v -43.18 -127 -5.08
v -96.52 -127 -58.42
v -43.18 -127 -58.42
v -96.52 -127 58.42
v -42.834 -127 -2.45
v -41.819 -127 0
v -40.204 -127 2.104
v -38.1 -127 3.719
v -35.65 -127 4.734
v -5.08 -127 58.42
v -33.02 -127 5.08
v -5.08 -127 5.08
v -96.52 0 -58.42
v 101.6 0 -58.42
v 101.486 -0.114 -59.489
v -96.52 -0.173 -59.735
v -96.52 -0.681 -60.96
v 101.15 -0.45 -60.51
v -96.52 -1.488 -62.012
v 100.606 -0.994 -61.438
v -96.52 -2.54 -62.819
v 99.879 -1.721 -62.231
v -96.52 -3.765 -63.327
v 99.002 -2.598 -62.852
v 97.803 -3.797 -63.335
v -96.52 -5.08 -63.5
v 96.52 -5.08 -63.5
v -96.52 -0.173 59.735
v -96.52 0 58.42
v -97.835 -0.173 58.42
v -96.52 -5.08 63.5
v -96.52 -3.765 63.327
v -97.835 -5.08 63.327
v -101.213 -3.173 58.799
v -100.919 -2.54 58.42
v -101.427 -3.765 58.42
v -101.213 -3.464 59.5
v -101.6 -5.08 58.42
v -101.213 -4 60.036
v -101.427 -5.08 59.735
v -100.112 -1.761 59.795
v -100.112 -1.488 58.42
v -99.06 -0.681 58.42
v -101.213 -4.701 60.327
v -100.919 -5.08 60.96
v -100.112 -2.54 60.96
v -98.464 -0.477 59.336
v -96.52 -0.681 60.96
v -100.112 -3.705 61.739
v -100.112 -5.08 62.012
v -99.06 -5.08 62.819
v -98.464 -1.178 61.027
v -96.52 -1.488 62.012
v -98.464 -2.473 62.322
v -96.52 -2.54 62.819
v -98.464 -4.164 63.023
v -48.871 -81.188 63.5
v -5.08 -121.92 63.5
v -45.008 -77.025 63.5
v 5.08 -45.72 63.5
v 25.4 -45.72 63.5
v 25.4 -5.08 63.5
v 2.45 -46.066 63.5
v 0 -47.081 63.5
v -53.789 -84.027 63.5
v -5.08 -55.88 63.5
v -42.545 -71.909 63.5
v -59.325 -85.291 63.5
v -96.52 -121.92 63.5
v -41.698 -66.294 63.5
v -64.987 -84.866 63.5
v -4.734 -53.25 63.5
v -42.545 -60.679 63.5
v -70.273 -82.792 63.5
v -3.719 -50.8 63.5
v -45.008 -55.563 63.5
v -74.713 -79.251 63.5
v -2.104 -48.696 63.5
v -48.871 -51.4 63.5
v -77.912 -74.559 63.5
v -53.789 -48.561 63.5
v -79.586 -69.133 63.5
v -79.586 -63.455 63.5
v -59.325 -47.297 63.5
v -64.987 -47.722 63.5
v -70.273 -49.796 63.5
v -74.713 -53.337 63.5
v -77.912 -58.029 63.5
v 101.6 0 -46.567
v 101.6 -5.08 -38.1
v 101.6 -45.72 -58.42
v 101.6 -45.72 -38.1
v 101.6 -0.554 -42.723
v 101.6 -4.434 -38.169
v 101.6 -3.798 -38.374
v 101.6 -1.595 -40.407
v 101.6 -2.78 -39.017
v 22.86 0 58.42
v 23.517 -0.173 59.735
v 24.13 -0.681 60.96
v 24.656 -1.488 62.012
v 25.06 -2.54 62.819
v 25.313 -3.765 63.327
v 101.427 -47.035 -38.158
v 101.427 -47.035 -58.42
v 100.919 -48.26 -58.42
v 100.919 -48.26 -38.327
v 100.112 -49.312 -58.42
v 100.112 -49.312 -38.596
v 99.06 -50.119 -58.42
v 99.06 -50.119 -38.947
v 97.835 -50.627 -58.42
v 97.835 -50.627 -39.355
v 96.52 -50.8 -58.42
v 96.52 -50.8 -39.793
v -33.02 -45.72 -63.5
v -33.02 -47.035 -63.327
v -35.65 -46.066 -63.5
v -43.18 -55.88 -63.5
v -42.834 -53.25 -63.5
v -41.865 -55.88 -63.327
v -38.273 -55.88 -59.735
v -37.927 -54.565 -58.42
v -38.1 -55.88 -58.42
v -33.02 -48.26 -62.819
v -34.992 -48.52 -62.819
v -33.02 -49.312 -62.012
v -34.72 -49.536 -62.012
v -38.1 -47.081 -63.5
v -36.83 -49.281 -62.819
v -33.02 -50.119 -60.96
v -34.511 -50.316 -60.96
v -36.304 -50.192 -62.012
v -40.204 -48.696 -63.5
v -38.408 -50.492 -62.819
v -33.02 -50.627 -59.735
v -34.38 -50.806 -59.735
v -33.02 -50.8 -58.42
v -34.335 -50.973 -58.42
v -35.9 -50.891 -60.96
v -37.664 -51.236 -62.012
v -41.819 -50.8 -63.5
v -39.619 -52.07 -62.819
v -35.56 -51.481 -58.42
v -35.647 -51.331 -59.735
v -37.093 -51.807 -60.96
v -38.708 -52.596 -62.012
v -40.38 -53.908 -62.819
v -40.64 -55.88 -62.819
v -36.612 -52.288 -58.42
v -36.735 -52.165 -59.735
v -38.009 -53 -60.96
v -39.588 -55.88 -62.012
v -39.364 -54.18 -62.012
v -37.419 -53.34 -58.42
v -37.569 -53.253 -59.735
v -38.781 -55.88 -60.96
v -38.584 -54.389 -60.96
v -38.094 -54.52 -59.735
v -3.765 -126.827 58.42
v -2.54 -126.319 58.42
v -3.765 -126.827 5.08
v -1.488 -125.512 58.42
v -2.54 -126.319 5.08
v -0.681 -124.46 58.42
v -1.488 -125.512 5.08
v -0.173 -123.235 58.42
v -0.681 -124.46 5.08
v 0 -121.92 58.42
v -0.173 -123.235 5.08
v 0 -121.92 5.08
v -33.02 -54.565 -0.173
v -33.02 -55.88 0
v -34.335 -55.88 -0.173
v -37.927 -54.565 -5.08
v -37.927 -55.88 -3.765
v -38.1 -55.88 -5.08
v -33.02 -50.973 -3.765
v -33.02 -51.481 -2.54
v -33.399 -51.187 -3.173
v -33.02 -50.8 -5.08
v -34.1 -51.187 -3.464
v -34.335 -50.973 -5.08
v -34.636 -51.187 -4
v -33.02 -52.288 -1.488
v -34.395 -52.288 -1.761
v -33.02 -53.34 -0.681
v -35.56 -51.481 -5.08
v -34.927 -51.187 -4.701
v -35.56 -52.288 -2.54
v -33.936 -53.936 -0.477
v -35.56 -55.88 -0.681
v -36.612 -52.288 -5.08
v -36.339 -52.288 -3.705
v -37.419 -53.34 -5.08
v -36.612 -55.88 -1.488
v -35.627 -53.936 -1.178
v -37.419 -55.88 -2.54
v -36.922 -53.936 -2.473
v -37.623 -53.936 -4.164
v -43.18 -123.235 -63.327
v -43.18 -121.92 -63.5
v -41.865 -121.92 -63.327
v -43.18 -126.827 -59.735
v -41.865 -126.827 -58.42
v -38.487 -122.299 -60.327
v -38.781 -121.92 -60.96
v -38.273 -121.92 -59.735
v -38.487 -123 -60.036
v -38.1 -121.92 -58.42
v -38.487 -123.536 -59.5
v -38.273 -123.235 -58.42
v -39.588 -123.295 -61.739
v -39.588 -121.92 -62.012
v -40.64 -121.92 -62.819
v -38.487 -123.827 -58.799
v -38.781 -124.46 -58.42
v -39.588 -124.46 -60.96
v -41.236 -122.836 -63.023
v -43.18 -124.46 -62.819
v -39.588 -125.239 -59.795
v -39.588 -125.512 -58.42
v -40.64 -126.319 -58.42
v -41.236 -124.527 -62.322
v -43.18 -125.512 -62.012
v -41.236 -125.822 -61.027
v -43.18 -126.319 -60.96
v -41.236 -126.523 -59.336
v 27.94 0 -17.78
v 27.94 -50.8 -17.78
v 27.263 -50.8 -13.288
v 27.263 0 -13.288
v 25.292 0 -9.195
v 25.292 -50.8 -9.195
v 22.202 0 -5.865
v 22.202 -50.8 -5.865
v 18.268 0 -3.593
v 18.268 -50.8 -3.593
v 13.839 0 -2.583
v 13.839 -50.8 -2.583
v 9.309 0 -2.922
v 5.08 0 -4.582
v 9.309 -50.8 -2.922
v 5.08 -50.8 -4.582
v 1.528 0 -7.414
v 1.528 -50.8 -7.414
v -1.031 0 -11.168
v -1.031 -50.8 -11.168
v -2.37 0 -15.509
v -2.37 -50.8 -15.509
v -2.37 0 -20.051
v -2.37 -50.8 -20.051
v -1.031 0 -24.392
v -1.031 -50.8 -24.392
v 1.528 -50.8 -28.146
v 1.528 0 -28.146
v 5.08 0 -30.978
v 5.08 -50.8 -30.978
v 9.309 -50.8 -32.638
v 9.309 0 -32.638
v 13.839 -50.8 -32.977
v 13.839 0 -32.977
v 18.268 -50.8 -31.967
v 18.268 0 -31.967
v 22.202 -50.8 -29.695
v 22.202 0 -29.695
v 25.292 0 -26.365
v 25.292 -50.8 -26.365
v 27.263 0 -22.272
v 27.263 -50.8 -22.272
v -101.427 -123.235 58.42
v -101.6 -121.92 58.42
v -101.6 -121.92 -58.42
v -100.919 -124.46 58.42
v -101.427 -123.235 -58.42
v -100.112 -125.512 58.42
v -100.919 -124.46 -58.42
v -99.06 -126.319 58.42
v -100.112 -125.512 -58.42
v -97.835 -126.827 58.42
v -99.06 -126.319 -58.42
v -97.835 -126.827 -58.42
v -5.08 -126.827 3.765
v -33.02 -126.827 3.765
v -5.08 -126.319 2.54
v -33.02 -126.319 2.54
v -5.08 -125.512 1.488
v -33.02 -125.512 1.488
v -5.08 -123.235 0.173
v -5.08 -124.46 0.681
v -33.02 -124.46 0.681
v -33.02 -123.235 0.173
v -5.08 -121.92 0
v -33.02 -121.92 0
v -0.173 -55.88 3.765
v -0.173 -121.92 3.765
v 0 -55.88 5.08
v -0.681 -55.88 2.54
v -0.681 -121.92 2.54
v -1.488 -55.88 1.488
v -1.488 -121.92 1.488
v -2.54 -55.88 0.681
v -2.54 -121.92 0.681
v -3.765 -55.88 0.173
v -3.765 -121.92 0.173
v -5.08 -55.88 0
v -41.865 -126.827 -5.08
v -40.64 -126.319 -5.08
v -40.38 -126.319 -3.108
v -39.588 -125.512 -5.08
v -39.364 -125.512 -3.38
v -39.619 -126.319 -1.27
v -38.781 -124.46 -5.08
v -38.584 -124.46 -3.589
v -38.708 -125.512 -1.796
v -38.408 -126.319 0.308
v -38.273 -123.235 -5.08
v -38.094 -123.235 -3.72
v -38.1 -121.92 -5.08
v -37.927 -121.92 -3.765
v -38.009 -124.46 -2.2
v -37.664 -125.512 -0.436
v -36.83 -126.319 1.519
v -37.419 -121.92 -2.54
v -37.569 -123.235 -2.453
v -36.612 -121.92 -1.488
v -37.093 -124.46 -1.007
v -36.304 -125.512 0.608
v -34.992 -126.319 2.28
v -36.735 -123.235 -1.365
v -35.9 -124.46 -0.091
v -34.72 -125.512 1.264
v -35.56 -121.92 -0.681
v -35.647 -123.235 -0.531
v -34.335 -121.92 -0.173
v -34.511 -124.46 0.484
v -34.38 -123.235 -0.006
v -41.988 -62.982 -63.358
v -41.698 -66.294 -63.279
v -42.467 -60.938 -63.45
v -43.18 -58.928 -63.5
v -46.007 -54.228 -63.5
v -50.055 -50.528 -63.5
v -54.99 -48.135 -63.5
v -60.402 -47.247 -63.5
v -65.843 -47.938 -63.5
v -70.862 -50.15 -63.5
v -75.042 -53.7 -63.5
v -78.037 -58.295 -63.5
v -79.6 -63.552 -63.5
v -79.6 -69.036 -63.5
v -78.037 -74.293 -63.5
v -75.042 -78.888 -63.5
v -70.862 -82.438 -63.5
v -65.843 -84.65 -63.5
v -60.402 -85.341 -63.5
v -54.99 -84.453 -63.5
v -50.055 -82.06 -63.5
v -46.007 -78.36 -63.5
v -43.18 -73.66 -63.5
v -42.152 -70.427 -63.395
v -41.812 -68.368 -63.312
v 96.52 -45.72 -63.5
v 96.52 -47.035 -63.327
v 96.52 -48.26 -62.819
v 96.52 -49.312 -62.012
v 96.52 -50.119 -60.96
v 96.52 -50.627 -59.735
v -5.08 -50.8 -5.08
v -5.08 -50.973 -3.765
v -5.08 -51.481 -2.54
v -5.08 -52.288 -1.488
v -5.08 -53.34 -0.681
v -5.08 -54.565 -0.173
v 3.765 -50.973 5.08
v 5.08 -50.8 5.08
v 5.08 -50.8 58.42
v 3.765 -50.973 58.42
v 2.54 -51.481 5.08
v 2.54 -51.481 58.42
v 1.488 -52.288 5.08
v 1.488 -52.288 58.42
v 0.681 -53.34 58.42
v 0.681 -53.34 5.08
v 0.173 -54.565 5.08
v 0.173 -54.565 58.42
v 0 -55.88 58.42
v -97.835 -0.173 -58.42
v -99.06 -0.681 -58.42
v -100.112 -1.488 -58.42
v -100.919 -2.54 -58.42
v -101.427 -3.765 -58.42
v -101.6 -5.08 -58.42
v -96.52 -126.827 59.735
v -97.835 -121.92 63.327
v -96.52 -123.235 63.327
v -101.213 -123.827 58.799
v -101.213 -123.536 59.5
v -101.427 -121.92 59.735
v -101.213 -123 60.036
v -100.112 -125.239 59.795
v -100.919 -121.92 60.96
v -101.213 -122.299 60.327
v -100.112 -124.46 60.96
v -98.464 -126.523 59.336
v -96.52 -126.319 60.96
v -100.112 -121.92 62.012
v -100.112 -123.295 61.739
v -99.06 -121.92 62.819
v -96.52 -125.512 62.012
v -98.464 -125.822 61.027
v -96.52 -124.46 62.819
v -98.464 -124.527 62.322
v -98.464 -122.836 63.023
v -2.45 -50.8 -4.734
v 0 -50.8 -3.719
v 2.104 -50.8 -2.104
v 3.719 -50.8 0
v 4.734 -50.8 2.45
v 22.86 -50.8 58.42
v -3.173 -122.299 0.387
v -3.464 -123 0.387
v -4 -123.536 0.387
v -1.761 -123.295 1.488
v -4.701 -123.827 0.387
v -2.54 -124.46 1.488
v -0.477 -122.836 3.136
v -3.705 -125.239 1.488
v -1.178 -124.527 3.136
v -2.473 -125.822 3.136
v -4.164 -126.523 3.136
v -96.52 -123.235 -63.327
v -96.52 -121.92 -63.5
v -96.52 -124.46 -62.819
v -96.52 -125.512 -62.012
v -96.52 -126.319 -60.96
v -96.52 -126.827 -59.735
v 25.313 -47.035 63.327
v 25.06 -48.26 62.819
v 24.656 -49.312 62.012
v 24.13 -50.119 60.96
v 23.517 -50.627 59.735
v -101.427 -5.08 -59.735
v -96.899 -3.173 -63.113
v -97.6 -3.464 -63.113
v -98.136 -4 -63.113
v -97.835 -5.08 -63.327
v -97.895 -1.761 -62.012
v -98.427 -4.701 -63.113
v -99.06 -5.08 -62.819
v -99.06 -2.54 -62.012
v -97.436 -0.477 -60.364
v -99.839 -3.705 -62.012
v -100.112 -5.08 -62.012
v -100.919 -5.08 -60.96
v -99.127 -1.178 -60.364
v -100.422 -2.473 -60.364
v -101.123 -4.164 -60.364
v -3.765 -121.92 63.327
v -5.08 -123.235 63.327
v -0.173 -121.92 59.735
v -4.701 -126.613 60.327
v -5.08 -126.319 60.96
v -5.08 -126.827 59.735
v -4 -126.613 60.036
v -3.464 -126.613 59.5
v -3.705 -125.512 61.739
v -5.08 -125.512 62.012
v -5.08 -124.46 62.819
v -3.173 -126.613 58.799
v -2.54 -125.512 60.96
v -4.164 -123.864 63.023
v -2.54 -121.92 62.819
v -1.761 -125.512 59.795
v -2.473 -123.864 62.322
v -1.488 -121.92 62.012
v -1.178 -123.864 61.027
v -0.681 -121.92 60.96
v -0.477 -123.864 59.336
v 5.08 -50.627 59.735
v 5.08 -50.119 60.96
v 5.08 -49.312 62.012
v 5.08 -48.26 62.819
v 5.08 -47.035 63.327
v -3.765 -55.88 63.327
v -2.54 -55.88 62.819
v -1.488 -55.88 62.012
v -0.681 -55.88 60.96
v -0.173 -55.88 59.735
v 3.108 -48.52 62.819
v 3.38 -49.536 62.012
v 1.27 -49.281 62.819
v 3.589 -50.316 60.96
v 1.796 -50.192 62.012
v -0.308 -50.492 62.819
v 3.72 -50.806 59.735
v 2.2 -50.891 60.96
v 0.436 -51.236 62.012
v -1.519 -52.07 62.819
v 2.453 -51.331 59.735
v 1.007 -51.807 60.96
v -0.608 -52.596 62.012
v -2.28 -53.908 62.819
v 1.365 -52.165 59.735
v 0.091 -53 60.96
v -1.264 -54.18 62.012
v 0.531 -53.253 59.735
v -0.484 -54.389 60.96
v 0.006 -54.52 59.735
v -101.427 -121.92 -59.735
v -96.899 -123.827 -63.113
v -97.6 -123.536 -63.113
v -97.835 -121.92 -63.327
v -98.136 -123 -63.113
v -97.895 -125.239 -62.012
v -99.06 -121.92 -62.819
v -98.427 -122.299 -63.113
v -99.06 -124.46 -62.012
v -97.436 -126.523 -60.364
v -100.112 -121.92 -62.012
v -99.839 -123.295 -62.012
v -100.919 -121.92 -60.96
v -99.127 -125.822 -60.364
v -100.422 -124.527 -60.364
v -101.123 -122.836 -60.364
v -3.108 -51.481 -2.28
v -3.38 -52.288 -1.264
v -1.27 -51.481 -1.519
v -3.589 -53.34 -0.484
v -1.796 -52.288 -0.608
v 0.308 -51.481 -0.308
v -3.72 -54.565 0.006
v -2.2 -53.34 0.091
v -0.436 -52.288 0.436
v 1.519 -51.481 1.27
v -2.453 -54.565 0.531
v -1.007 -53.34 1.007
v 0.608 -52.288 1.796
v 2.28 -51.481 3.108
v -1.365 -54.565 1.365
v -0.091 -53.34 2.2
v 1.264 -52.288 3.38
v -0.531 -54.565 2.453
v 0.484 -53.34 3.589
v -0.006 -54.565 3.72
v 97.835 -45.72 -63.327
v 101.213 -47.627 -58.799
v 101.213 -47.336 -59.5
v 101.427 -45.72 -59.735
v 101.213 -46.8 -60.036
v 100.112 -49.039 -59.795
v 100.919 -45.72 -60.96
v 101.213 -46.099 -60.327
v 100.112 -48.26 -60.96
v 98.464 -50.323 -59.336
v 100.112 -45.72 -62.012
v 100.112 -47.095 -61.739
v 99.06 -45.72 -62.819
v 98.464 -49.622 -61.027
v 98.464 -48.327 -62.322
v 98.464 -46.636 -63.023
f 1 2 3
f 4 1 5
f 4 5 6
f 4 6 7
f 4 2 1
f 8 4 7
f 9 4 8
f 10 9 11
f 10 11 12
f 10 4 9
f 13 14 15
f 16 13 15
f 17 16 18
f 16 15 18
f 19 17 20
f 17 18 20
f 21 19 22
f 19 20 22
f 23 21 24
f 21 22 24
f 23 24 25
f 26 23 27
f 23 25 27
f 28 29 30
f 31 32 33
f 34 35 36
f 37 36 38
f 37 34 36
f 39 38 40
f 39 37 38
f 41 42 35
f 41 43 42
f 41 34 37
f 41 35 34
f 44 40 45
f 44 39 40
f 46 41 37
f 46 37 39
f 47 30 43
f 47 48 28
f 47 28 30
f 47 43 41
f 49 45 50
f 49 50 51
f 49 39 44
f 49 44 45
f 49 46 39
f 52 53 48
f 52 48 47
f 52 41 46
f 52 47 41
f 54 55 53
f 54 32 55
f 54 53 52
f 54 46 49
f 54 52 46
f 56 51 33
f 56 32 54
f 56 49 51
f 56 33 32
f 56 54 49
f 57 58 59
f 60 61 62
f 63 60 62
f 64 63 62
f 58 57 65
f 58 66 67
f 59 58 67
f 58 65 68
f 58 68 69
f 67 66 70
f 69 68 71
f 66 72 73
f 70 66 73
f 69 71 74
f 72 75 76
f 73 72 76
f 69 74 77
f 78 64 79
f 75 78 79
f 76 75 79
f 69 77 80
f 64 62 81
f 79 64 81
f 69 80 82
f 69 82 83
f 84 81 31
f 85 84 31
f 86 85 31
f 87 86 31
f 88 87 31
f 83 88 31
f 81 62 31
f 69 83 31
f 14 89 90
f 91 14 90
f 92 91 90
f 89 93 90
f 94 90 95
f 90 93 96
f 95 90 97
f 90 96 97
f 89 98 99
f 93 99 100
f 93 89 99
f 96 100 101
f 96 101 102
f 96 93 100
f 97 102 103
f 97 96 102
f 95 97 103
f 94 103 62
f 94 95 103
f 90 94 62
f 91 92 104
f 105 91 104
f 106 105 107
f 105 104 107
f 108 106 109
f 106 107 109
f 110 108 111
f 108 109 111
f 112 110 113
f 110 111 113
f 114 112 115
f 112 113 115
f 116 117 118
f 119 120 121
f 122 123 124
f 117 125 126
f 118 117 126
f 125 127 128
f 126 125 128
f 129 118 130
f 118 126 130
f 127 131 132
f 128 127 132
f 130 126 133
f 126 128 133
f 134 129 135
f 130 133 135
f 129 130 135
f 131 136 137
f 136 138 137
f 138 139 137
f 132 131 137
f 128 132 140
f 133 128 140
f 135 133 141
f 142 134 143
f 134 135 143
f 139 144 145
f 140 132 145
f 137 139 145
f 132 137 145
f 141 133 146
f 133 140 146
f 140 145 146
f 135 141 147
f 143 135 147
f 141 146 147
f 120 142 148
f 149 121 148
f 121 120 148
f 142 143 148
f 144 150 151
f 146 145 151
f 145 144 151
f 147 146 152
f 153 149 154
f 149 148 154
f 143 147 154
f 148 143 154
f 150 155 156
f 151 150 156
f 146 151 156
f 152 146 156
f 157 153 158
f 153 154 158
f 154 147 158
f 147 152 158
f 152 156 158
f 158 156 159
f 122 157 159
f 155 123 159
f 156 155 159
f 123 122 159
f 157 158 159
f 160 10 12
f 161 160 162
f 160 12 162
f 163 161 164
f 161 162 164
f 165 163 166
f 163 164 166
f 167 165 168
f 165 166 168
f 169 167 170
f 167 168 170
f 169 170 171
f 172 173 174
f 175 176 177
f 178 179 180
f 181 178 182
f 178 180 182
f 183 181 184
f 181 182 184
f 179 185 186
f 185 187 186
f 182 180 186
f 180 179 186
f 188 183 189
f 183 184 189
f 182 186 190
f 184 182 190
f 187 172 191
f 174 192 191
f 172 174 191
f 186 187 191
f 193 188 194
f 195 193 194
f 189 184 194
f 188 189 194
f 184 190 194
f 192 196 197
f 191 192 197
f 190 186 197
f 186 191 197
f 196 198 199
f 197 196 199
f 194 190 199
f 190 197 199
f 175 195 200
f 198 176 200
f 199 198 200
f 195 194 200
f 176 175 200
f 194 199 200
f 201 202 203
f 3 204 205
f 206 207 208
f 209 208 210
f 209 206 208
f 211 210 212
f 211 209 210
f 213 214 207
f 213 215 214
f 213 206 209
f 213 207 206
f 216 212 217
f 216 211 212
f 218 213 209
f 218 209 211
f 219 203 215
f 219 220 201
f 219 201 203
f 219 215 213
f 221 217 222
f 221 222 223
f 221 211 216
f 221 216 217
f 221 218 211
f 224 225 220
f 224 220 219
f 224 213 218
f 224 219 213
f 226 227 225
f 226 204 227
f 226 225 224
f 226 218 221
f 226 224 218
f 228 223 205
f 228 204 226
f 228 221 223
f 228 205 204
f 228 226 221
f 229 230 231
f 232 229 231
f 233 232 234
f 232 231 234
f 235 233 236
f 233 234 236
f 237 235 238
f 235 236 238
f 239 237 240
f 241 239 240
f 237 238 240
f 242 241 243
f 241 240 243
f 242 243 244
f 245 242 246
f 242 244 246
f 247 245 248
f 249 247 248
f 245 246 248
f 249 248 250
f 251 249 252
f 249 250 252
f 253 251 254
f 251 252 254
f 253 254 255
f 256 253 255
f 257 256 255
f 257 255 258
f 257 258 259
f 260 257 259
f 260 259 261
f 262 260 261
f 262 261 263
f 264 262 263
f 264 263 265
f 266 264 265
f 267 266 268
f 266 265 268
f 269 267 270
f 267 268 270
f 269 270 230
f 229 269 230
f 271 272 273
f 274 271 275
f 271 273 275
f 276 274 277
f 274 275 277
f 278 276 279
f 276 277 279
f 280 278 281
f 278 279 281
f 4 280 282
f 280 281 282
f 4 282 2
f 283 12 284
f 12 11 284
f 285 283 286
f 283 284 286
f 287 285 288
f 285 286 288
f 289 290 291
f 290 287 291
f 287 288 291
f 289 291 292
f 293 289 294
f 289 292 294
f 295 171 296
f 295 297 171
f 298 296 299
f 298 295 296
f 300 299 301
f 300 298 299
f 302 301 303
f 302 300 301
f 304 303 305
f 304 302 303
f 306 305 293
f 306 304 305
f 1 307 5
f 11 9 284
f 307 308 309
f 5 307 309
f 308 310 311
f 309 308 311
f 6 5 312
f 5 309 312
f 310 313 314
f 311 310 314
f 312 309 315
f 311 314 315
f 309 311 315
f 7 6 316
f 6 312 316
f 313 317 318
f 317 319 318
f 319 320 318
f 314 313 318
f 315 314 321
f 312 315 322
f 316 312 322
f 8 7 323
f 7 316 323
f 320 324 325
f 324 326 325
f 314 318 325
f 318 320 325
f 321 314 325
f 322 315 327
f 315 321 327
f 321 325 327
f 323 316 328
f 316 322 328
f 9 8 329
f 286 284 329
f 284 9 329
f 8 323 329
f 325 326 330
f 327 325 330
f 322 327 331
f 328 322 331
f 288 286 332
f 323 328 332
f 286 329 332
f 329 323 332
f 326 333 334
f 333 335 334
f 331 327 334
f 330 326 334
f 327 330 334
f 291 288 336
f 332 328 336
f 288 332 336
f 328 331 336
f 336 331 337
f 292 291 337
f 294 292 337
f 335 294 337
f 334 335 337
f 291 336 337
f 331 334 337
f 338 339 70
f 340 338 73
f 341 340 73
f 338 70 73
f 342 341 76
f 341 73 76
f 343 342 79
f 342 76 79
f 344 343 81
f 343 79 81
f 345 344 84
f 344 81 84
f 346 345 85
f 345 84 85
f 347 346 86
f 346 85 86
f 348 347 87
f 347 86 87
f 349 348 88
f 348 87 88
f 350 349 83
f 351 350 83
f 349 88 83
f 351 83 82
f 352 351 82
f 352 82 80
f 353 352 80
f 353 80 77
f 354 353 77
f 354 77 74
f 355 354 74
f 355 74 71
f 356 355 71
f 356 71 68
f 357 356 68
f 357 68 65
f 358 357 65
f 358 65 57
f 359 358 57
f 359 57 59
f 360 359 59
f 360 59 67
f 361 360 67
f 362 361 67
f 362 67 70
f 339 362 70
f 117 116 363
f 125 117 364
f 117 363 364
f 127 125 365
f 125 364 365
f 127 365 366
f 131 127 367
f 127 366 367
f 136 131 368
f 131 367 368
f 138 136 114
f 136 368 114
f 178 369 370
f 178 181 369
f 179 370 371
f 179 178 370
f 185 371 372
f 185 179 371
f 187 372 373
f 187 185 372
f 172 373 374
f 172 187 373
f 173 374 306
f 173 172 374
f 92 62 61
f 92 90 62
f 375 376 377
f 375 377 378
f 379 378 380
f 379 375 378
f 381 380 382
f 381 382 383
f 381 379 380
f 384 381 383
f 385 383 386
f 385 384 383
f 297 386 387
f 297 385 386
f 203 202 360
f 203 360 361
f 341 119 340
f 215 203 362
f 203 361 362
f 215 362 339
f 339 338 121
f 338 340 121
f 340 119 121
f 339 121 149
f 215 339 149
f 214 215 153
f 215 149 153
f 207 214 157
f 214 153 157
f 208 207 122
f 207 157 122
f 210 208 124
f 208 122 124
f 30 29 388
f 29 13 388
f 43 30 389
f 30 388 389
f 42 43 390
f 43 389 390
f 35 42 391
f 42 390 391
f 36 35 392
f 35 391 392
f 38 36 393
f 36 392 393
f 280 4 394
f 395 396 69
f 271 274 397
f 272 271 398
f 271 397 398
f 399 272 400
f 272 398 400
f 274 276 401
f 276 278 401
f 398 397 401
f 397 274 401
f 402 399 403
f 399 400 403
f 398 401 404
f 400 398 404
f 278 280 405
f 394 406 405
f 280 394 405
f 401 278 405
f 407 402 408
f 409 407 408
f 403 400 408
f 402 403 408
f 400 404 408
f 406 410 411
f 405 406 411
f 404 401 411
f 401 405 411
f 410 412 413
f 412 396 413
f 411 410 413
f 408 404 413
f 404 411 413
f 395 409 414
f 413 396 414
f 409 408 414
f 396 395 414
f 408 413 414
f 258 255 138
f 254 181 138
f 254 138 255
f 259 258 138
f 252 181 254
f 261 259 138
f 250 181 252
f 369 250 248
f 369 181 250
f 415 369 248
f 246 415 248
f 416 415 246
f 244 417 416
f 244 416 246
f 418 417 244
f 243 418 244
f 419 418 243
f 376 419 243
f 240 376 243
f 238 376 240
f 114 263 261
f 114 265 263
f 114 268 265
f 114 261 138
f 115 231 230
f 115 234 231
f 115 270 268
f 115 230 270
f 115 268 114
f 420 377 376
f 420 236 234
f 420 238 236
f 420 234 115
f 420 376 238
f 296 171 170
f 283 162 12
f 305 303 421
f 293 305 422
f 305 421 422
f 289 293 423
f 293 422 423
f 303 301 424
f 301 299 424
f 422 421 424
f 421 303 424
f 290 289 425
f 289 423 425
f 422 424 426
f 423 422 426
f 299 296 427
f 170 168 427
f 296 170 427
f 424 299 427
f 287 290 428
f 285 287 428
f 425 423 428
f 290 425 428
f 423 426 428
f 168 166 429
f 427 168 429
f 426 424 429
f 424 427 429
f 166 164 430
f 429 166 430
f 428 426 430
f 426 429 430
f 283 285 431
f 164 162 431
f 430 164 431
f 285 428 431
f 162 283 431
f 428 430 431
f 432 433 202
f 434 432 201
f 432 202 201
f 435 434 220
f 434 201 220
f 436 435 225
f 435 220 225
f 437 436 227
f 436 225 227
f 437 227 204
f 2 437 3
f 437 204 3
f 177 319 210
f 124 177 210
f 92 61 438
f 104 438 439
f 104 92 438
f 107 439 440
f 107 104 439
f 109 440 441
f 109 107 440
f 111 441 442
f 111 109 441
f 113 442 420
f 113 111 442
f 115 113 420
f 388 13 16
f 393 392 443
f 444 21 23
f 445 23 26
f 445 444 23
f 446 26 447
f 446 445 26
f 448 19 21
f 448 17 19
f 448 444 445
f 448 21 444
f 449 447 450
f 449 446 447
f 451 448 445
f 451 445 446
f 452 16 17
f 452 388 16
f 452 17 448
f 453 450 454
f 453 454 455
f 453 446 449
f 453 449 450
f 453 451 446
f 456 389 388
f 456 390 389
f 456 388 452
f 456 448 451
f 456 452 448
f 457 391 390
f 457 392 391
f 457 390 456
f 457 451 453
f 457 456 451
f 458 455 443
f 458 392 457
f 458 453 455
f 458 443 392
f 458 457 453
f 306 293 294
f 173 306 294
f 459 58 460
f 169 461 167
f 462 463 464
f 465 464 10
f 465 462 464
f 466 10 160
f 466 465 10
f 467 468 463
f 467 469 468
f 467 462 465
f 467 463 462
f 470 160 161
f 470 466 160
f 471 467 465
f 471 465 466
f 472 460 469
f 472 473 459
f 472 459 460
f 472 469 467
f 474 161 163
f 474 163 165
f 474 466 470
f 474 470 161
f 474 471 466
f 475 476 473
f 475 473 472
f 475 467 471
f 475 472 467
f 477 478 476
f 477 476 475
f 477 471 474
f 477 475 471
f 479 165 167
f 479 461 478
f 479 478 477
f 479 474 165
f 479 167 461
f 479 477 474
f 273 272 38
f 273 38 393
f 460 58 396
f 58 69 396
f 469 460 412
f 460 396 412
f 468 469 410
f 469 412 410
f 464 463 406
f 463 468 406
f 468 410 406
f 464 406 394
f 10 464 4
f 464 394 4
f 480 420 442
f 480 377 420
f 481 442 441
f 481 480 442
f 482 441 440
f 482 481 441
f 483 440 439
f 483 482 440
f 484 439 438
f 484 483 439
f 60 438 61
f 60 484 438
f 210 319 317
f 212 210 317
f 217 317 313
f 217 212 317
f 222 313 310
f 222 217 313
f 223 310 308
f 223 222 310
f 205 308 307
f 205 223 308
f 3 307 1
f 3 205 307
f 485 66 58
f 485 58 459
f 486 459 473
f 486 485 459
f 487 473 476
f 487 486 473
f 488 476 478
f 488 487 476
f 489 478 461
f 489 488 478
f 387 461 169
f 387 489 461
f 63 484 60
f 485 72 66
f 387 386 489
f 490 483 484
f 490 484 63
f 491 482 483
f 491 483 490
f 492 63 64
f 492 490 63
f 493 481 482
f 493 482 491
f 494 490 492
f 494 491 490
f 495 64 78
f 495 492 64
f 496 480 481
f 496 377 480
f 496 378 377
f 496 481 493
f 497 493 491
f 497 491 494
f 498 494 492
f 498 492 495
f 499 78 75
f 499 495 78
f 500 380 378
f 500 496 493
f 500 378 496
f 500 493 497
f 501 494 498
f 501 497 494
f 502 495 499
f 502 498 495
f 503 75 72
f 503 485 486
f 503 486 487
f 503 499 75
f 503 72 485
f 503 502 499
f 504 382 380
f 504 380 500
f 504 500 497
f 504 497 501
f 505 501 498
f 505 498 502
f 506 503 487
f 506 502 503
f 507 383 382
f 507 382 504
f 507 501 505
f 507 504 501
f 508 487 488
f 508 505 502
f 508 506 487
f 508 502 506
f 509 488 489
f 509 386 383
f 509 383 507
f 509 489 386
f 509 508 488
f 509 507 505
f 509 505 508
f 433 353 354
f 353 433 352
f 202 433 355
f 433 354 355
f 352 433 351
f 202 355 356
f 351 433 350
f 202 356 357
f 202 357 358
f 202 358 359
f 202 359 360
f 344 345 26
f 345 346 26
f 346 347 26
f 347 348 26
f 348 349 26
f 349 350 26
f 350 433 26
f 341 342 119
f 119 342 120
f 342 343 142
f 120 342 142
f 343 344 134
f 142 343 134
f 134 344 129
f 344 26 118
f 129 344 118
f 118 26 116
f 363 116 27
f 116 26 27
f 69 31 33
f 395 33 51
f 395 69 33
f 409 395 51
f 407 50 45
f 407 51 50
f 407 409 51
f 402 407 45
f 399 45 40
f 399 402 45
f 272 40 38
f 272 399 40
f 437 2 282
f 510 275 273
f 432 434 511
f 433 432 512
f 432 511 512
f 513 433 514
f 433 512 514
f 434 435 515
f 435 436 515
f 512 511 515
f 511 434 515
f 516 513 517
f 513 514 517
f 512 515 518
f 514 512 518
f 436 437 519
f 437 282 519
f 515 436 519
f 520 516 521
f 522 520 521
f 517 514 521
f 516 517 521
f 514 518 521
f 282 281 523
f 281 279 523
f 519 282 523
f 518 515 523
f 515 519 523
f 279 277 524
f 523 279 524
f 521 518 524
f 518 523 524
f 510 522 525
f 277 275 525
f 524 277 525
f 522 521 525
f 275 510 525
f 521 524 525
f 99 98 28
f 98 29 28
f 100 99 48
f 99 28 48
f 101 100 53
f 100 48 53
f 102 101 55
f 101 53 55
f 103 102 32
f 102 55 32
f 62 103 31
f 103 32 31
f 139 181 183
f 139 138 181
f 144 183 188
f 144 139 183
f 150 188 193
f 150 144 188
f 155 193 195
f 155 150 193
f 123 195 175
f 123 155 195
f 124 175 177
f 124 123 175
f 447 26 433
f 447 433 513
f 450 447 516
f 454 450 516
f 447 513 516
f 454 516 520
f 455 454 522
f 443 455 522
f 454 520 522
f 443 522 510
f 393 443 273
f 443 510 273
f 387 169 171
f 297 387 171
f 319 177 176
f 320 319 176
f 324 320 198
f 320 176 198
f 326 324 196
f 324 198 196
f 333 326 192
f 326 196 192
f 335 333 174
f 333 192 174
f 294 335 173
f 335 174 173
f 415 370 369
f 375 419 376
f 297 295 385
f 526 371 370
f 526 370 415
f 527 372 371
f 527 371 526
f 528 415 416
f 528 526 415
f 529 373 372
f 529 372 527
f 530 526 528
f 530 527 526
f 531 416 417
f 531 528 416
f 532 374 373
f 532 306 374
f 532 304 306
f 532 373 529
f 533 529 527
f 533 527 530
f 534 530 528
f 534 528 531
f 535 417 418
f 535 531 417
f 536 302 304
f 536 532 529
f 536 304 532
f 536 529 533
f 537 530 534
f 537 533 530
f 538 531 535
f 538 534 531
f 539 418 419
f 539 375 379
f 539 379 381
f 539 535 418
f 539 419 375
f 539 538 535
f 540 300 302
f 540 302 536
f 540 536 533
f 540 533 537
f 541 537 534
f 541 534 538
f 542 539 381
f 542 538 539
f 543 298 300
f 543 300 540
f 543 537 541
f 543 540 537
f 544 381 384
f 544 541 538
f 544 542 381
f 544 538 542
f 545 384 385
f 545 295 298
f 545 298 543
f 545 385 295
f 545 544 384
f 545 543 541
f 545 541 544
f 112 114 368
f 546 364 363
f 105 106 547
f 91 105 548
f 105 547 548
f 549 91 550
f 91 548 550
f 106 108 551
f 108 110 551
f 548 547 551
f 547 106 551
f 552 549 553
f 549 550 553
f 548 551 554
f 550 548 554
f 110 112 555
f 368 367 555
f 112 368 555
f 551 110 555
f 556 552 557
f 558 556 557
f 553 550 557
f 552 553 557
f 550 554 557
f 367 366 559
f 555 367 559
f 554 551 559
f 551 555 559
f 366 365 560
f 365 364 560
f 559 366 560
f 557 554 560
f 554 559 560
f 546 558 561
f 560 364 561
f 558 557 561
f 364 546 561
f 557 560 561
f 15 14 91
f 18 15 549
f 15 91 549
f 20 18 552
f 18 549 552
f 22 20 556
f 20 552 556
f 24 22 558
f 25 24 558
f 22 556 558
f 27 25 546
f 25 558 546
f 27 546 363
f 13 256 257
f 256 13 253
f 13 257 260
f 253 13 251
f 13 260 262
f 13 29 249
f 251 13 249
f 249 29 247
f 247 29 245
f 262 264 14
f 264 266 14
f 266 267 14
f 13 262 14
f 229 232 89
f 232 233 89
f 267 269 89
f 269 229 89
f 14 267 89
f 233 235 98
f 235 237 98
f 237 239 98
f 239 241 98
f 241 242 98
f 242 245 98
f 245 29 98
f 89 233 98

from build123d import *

# Parameters (mm, degrees)
F1_DEPTH = 127
F3_DEPTH = 76.2
F4_SIZE2 = 101.6
F4_SIZE  = 76.2
F5_R     = 5.08
F6_R     = 15.24
F7_DEPTH = 50.8
F8_R     = 19.05
F9_DEPTH = 127


with BuildPart() as f1:
    # F0 (on Front) → F1 (new body)
    with BuildSketch(Plane.XZ):
        Polygon((101.6, -63.5), (101.6, 63.5), (0, 63.5), (0, 0), (-38.1, 0), (-38.1, -63.5), align=None)
        Polygon((0, 0), (0, 63.5), (-101.6, 63.5), (-101.6, -63.5), (-38.1, -63.5), (-38.1, 0), align=None)
    extrude(amount=F1_DEPTH)

    # F2 (on face) → F3 (cut)
    with BuildSketch(Plane.XZ.offset(127)):
        Polygon((-38.1, 0), (-38.1, -63.5), (101.6, -63.5), (101.6, 63.5), (0, 63.5), (0, 0), align=None)
    extrude(amount=-F3_DEPTH, mode=Mode.SUBTRACT)

    # F4
    f4_edges = [f1.edges().sort_by_distance(p)[0] for p in [
        (101.6, -25.4, 63.5),
    ]]
    f4_side = f1.faces().sort_by_distance((-21.771429, -52.614286, 63.5))[0]
    chamfer(f4_edges, length=F4_SIZE, length2=F4_SIZE2, reference=f4_side)

    # F5
    f5_edges = [f1.edges().sort_by_distance(p)[0] for p in [
        (63.5, -50.8, 12.7),
        (63.5, 0, 12.7),
        (12.7, -50.8, 63.5),
        (0, -88.9, 63.5),
        (-50.8, -127, 63.5),
        (0, -127, 31.75),
        (0, -88.9, 0),
        (31.75, -50.8, -63.5),
        (101.6, -50.8, -50.8),
        (101.6, -25.4, -63.5),
        (-101.6, -127, 0),
        (-69.85, -127, -63.5),
        (-38.1, 0, 63.5),
        (-101.6, 0, 0),
        (0, 0, -63.5),
        (-101.6, -63.5, -63.5),
        (-38.1, -88.9, -63.5),
        (-101.6, -63.5, 63.5),
        (-38.1, -127, -31.75),
        (-19.05, -127, 0),
        (-38.1, -88.9, 0),
        (-19.05, -50.8, 0),
        (-38.1, -50.8, -31.75),
        (0, -50.8, 31.75),
    ]]
    fillet(f5_edges, radius=F5_R)

    # F6 (on face) → F7 (cut, through all)
    with BuildSketch(Plane.XZ.offset(50.8)):
        with Locations((12.7, -17.78)):
            Circle(F6_R)
    extrude(amount=-F7_DEPTH, mode=Mode.SUBTRACT)

    # F8 (on face) → F9 (cut, through all)
    with BuildSketch(Plane.XY.offset(63.5)):
        with Locations((-60.7483349741, -66.2939995527)):
            Circle(F8_R)
    extrude(amount=-F9_DEPTH, mode=Mode.SUBTRACT)


solid = f1.part
